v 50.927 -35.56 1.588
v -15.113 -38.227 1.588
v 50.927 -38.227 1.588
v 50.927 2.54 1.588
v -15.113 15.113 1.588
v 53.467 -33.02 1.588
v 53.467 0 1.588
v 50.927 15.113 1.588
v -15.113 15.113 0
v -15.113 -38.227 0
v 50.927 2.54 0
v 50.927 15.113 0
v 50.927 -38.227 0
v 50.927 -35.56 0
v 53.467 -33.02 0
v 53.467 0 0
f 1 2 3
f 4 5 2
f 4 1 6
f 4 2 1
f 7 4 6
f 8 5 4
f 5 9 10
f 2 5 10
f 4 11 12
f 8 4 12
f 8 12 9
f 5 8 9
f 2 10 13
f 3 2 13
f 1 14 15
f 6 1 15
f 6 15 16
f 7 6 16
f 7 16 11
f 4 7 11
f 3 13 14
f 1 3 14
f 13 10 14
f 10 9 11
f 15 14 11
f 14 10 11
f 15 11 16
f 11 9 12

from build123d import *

# Parameters (mm, degrees)
F1_DEPTH = 1.588


with BuildPart() as f1:
    # F0 (on Top) → F1 (new body)
    with BuildSketch(Plane.XY):
        Polygon((50.927, 15.113), (-15.113, 15.113), (-15.113, -38.227), (50.927, -38.227), (50.927, -35.56), (50.927, 2.54), align=None)
        Polygon((53.467, 0), (50.927, 2.54), (50.927, -35.56), (53.467, -33.02), align=None)
    extrude(amount=F1_DEPTH)


solid = f1.part
